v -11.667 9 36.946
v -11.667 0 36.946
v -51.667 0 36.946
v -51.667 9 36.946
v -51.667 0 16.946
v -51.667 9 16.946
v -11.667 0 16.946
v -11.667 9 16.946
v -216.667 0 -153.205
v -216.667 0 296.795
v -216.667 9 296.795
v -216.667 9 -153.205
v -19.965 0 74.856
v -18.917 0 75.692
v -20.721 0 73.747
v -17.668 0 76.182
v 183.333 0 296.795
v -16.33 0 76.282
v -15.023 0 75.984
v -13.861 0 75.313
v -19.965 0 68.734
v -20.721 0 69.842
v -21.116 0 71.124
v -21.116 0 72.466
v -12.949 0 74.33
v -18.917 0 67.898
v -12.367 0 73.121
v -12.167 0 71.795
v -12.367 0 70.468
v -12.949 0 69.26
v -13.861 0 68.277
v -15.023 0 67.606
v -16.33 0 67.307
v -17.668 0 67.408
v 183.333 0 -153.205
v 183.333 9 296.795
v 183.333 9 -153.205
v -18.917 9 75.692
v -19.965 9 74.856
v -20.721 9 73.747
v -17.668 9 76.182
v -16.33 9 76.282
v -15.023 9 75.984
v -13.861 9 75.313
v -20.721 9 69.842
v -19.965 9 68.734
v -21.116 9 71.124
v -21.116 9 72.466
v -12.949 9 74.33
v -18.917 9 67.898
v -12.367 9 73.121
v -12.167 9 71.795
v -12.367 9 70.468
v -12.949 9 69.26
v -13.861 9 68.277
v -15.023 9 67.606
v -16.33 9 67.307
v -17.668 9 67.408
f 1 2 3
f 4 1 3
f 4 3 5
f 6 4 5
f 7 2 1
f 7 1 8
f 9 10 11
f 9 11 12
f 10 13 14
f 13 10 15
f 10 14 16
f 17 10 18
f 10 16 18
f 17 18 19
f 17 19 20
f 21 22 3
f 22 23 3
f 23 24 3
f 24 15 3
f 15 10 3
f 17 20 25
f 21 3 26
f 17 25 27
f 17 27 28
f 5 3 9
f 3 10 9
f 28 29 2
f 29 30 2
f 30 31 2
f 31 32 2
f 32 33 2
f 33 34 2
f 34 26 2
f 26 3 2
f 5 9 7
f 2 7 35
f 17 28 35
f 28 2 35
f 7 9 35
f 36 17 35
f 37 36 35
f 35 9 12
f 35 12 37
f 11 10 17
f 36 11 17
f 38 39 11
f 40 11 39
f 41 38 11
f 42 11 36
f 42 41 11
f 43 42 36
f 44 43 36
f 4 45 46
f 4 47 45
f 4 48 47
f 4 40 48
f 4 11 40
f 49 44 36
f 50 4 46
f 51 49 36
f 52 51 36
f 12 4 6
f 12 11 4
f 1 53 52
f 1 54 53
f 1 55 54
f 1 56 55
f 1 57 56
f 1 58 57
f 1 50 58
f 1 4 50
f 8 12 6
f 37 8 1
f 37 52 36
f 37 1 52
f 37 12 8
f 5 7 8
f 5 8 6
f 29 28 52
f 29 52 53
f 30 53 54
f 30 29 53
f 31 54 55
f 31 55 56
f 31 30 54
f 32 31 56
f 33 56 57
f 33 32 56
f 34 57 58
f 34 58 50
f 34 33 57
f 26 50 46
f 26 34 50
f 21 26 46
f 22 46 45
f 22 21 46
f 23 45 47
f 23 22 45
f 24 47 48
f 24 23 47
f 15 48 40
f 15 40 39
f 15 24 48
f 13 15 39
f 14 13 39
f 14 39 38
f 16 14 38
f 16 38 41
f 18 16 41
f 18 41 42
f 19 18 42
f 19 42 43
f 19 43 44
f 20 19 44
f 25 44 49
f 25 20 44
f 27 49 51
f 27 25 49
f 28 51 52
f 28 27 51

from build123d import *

# Parameters (mm, degrees)
SKETCH1_W           = 400
SKETCH1_H           = 450
BOSS_EXTRUDE5_DEPTH = 9
SKETCH4_R           = 4.5
CUT_EXTRUDE2_DEPTH  = 9
SKETCH5_W           = 40
SKETCH5_H           = 20
CUT_EXTRUDE3_DEPTH  = 9


with BuildPart() as part:
    # Sketch1 → Boss-Extrude5 (new body)
    with BuildSketch(Plane(origin=(0, 0, 0), x_dir=(1, 0, 0), z_dir=(0, 1, 0))):
        with Locations((-16.666666667, -71.794871795)):
            Rectangle(SKETCH1_W, SKETCH1_H)
    extrude(amount=BOSS_EXTRUDE5_DEPTH)

    # Sketch4 → Cut-Extrude2 (cut)
    with BuildSketch(Plane(origin=(0, 0, 0), x_dir=(1, 0, 0), z_dir=(0, 1, 0))):
        with Locations((-16.666666667, -71.794871795)):
            Circle(SKETCH4_R)
    extrude(amount=CUT_EXTRUDE2_DEPTH, mode=Mode.SUBTRACT)

    # Sketch5 → Cut-Extrude3 (cut)
    with BuildSketch(Plane(origin=(0, 0, 0), x_dir=(-1, 0, 0), z_dir=(0, -1, 0))):
        with Locations((31.666666667, -26.945924524)):
            Rectangle(SKETCH5_W, SKETCH5_H)
    extrude(amount=-CUT_EXTRUDE3_DEPTH, mode=Mode.SUBTRACT)


solid = part.part
